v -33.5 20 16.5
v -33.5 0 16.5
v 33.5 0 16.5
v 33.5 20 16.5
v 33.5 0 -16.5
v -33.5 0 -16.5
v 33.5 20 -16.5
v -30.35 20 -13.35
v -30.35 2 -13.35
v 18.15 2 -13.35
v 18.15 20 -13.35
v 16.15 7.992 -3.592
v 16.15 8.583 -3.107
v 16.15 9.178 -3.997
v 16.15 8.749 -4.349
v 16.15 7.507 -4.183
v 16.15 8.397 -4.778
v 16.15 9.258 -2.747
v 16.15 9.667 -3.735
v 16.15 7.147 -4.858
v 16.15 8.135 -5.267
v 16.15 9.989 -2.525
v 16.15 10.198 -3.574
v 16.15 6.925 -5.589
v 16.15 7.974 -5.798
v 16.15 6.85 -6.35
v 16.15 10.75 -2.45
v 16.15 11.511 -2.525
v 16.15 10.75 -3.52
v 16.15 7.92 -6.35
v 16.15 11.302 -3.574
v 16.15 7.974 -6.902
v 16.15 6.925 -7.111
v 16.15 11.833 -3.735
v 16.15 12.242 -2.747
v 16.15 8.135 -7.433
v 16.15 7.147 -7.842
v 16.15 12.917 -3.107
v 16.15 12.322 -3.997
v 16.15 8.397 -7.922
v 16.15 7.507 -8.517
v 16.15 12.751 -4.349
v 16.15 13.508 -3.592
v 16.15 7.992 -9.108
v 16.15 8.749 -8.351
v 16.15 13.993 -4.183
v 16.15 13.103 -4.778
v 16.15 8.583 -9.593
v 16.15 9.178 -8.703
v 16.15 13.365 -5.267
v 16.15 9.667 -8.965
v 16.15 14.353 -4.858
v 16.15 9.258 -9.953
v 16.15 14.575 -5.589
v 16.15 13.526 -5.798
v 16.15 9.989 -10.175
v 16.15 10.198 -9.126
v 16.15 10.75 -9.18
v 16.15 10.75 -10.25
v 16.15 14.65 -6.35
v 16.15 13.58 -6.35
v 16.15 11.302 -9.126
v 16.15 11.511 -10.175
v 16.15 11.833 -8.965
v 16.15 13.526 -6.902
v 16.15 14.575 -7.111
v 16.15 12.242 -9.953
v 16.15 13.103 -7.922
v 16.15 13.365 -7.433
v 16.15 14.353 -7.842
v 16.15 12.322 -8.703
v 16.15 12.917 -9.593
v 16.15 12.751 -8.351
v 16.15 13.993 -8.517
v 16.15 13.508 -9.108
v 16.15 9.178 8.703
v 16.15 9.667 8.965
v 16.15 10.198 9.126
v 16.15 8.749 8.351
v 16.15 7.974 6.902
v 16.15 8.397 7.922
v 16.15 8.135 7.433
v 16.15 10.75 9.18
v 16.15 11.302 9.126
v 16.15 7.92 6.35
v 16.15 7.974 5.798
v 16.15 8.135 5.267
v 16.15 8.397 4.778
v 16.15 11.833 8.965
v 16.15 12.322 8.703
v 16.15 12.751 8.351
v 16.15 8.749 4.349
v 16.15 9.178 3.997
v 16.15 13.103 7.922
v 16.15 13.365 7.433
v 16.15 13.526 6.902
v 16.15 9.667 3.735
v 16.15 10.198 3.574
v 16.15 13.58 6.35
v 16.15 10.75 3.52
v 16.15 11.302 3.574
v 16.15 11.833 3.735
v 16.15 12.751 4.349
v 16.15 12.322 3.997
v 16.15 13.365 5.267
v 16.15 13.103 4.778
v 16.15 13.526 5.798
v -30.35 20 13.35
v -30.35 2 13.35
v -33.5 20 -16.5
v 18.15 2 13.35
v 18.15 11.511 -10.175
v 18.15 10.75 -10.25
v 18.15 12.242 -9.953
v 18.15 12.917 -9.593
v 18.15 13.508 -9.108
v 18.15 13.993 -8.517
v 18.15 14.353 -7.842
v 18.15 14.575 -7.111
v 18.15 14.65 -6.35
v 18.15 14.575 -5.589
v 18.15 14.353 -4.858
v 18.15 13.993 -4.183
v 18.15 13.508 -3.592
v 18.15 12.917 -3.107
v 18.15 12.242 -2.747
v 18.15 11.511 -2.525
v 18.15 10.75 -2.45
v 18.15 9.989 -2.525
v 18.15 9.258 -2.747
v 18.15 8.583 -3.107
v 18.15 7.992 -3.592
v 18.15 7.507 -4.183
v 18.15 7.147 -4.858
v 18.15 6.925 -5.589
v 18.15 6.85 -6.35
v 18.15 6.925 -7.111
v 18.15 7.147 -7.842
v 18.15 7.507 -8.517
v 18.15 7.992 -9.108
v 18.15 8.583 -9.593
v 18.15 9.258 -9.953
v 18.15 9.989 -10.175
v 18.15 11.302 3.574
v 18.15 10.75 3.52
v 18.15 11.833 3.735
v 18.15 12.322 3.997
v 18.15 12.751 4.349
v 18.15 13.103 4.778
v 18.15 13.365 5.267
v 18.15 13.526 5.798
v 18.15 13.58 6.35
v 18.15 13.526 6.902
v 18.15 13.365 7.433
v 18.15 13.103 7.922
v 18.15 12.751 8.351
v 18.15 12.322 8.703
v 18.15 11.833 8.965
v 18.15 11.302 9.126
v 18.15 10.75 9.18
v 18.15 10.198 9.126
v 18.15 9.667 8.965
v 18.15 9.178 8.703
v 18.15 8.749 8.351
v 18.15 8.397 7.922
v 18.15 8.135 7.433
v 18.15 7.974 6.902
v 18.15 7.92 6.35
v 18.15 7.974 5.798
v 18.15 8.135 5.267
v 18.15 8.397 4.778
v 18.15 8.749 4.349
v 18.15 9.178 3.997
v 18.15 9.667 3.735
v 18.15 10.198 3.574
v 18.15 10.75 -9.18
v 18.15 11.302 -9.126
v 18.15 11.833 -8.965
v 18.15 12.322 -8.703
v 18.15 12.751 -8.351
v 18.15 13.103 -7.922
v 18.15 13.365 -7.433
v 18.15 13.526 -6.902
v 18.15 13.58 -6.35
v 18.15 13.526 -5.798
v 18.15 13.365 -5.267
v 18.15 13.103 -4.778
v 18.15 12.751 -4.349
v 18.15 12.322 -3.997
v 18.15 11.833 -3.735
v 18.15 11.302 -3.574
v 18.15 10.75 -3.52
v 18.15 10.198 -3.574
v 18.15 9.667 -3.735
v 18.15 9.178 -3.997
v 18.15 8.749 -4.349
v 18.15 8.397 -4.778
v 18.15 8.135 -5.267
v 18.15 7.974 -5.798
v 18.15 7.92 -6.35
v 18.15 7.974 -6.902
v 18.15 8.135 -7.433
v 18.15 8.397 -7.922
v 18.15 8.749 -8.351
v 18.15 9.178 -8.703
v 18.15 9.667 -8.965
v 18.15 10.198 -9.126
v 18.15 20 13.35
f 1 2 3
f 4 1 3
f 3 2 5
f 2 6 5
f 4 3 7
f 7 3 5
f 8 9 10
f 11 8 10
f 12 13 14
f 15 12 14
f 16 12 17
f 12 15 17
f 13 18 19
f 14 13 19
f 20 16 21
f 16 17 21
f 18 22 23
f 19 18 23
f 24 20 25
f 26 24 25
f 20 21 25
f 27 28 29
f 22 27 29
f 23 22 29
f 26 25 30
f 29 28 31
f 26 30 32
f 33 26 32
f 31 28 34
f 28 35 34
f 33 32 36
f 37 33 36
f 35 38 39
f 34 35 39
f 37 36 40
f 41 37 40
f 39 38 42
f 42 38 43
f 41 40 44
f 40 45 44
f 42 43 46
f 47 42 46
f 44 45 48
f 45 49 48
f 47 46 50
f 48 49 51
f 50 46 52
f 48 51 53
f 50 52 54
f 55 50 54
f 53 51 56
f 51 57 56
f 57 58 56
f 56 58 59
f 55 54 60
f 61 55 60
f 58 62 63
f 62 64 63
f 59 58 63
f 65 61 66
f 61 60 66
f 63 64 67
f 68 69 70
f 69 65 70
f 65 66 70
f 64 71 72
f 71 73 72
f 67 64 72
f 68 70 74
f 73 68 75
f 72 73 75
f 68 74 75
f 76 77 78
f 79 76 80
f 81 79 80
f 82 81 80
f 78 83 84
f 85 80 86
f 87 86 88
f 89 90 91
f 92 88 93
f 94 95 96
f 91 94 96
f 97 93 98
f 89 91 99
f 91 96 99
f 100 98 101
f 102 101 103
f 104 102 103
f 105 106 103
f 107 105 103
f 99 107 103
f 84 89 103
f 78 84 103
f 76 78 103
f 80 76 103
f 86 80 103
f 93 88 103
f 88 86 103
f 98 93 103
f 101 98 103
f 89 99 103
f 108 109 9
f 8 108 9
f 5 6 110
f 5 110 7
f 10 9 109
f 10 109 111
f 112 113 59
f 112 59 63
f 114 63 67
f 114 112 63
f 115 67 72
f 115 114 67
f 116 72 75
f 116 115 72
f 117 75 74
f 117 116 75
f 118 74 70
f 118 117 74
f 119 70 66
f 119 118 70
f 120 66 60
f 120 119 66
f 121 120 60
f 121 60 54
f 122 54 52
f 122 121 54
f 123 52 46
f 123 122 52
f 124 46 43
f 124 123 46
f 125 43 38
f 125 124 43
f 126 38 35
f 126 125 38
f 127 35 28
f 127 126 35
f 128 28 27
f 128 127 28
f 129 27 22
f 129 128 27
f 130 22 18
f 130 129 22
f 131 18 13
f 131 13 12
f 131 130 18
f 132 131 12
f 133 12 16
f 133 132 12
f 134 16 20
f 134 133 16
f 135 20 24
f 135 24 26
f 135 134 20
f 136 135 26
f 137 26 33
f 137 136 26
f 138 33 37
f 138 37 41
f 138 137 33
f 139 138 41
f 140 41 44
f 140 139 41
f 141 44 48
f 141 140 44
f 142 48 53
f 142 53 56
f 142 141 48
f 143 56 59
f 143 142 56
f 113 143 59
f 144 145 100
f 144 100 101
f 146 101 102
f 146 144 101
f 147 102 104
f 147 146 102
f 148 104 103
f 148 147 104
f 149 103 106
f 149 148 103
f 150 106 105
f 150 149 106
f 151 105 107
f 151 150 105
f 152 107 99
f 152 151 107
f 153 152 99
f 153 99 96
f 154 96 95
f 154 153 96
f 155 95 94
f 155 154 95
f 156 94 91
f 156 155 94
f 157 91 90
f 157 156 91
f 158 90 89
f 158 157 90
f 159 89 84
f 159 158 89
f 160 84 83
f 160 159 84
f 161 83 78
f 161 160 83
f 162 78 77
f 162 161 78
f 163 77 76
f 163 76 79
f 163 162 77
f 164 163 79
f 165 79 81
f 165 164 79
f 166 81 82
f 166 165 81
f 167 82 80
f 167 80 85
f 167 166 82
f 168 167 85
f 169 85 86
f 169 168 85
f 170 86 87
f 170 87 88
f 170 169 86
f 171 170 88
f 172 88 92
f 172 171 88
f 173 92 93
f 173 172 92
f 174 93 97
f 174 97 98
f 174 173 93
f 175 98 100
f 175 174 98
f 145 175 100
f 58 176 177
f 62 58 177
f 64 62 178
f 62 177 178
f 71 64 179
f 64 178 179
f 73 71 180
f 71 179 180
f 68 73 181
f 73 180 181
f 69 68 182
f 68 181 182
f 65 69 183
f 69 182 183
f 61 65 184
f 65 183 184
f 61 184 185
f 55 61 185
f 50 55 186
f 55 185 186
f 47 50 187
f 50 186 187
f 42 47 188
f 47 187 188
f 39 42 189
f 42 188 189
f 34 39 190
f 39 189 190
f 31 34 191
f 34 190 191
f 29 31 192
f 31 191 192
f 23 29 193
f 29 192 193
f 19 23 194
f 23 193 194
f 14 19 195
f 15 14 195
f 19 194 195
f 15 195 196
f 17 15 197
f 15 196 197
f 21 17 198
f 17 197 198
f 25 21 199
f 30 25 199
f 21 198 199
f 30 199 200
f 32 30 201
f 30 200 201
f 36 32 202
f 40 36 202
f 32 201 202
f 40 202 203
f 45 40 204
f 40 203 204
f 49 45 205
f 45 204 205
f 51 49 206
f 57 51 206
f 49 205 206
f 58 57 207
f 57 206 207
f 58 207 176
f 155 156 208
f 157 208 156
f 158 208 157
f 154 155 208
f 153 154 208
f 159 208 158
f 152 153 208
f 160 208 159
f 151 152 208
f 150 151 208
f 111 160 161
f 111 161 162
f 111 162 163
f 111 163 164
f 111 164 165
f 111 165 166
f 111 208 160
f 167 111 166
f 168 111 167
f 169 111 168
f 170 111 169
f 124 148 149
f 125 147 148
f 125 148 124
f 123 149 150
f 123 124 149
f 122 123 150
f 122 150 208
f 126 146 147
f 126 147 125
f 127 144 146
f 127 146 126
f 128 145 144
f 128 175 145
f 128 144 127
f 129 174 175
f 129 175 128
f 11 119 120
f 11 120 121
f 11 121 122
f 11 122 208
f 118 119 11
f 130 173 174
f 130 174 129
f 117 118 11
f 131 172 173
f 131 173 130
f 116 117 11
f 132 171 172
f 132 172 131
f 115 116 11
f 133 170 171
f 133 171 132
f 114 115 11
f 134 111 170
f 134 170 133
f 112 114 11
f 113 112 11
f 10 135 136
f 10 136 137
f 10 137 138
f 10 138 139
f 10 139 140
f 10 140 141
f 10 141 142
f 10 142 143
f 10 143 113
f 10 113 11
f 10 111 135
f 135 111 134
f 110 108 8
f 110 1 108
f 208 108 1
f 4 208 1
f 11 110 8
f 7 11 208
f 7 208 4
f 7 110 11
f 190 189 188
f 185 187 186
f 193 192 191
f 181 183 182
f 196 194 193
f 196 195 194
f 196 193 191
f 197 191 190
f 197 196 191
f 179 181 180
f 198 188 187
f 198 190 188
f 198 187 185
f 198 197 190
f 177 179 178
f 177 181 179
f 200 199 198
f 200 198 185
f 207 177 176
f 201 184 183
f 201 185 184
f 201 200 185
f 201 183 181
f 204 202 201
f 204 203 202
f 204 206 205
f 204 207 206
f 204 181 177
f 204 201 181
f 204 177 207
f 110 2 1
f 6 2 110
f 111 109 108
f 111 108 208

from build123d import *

# Parameters (mm, degrees)
ESBO_O1_W                = 67
ESBO_O1_H                = 33
ESBO_O1_W_2              = 60.7
ESBO_O1_H_2              = 26.7
ESBO_O1_W_3              = 12.2
RESSALTO_EXTRUS_O4_DEPTH = 20
ESBO_O3_W                = 48.5
ESBO_O3_H                = 26.7
RESSALTO_EXTRUS_O5_DEPTH = 2
RESSALTO_EXTRUS_O9_START = 18.15
ESBO_O4_R                = 3.9
ESBO_O4_R_2              = 2.83
RESSALTO_EXTRUS_O9_DEPTH = 2


with BuildPart() as part:
    # Esboço1 → Ressalto-extrusão4 (new body)
    # profile 1 of 2: a face of its own
    with BuildSketch(Plane(origin=(0, 0, 0), x_dir=(1, 0, 0), z_dir=(0, 1, 0))):
        Rectangle(ESBO_O1_W, ESBO_O1_H)
        Rectangle(ESBO_O1_W_2, ESBO_O1_H_2, mode=Mode.SUBTRACT)
    # profile 2 of 2: a face of its own
    with BuildSketch(Plane(origin=(0, 0, 0), x_dir=(1, 0, 0), z_dir=(0, 1, 0))):
        with Locations((24.25, 0)):
            Rectangle(ESBO_O1_W_3, ESBO_O1_H_2)
    extrude(amount=RESSALTO_EXTRUS_O4_DEPTH)

    # Esboço3 → Ressalto-extrusão5 (add)
    with BuildSketch(Plane(origin=(0, 0, 0), x_dir=(1, 0, 0), z_dir=(0, 1, 0))):
        with Locations((-6.1, 0)):
            Rectangle(ESBO_O3_W, ESBO_O3_H)
    extrude(amount=RESSALTO_EXTRUS_O5_DEPTH)

    # Esboço4 → Ressalto-extrusão9 (add)
    # profile 1 of 2: a face of its own
    with BuildSketch(Plane(origin=(0, 0, 0), x_dir=(0, 0, -1), z_dir=(1, 0, 0)).offset(RESSALTO_EXTRUS_O9_START)):
        with Locations((6.35, 10.75)):
            Circle(ESBO_O4_R)
        with Locations((6.35, 10.75)):
            Circle(ESBO_O4_R_2, mode=Mode.SUBTRACT)
    # profile 2 of 2: a face of its own
    with BuildSketch(Plane(origin=(0, 0, 0), x_dir=(0, 0, -1), z_dir=(1, 0, 0)).offset(RESSALTO_EXTRUS_O9_START)):
        with Locations((-6.35, 10.75)):
            Circle(ESBO_O4_R_2)
    extrude(amount=-RESSALTO_EXTRUS_O9_DEPTH)


solid = part.part
